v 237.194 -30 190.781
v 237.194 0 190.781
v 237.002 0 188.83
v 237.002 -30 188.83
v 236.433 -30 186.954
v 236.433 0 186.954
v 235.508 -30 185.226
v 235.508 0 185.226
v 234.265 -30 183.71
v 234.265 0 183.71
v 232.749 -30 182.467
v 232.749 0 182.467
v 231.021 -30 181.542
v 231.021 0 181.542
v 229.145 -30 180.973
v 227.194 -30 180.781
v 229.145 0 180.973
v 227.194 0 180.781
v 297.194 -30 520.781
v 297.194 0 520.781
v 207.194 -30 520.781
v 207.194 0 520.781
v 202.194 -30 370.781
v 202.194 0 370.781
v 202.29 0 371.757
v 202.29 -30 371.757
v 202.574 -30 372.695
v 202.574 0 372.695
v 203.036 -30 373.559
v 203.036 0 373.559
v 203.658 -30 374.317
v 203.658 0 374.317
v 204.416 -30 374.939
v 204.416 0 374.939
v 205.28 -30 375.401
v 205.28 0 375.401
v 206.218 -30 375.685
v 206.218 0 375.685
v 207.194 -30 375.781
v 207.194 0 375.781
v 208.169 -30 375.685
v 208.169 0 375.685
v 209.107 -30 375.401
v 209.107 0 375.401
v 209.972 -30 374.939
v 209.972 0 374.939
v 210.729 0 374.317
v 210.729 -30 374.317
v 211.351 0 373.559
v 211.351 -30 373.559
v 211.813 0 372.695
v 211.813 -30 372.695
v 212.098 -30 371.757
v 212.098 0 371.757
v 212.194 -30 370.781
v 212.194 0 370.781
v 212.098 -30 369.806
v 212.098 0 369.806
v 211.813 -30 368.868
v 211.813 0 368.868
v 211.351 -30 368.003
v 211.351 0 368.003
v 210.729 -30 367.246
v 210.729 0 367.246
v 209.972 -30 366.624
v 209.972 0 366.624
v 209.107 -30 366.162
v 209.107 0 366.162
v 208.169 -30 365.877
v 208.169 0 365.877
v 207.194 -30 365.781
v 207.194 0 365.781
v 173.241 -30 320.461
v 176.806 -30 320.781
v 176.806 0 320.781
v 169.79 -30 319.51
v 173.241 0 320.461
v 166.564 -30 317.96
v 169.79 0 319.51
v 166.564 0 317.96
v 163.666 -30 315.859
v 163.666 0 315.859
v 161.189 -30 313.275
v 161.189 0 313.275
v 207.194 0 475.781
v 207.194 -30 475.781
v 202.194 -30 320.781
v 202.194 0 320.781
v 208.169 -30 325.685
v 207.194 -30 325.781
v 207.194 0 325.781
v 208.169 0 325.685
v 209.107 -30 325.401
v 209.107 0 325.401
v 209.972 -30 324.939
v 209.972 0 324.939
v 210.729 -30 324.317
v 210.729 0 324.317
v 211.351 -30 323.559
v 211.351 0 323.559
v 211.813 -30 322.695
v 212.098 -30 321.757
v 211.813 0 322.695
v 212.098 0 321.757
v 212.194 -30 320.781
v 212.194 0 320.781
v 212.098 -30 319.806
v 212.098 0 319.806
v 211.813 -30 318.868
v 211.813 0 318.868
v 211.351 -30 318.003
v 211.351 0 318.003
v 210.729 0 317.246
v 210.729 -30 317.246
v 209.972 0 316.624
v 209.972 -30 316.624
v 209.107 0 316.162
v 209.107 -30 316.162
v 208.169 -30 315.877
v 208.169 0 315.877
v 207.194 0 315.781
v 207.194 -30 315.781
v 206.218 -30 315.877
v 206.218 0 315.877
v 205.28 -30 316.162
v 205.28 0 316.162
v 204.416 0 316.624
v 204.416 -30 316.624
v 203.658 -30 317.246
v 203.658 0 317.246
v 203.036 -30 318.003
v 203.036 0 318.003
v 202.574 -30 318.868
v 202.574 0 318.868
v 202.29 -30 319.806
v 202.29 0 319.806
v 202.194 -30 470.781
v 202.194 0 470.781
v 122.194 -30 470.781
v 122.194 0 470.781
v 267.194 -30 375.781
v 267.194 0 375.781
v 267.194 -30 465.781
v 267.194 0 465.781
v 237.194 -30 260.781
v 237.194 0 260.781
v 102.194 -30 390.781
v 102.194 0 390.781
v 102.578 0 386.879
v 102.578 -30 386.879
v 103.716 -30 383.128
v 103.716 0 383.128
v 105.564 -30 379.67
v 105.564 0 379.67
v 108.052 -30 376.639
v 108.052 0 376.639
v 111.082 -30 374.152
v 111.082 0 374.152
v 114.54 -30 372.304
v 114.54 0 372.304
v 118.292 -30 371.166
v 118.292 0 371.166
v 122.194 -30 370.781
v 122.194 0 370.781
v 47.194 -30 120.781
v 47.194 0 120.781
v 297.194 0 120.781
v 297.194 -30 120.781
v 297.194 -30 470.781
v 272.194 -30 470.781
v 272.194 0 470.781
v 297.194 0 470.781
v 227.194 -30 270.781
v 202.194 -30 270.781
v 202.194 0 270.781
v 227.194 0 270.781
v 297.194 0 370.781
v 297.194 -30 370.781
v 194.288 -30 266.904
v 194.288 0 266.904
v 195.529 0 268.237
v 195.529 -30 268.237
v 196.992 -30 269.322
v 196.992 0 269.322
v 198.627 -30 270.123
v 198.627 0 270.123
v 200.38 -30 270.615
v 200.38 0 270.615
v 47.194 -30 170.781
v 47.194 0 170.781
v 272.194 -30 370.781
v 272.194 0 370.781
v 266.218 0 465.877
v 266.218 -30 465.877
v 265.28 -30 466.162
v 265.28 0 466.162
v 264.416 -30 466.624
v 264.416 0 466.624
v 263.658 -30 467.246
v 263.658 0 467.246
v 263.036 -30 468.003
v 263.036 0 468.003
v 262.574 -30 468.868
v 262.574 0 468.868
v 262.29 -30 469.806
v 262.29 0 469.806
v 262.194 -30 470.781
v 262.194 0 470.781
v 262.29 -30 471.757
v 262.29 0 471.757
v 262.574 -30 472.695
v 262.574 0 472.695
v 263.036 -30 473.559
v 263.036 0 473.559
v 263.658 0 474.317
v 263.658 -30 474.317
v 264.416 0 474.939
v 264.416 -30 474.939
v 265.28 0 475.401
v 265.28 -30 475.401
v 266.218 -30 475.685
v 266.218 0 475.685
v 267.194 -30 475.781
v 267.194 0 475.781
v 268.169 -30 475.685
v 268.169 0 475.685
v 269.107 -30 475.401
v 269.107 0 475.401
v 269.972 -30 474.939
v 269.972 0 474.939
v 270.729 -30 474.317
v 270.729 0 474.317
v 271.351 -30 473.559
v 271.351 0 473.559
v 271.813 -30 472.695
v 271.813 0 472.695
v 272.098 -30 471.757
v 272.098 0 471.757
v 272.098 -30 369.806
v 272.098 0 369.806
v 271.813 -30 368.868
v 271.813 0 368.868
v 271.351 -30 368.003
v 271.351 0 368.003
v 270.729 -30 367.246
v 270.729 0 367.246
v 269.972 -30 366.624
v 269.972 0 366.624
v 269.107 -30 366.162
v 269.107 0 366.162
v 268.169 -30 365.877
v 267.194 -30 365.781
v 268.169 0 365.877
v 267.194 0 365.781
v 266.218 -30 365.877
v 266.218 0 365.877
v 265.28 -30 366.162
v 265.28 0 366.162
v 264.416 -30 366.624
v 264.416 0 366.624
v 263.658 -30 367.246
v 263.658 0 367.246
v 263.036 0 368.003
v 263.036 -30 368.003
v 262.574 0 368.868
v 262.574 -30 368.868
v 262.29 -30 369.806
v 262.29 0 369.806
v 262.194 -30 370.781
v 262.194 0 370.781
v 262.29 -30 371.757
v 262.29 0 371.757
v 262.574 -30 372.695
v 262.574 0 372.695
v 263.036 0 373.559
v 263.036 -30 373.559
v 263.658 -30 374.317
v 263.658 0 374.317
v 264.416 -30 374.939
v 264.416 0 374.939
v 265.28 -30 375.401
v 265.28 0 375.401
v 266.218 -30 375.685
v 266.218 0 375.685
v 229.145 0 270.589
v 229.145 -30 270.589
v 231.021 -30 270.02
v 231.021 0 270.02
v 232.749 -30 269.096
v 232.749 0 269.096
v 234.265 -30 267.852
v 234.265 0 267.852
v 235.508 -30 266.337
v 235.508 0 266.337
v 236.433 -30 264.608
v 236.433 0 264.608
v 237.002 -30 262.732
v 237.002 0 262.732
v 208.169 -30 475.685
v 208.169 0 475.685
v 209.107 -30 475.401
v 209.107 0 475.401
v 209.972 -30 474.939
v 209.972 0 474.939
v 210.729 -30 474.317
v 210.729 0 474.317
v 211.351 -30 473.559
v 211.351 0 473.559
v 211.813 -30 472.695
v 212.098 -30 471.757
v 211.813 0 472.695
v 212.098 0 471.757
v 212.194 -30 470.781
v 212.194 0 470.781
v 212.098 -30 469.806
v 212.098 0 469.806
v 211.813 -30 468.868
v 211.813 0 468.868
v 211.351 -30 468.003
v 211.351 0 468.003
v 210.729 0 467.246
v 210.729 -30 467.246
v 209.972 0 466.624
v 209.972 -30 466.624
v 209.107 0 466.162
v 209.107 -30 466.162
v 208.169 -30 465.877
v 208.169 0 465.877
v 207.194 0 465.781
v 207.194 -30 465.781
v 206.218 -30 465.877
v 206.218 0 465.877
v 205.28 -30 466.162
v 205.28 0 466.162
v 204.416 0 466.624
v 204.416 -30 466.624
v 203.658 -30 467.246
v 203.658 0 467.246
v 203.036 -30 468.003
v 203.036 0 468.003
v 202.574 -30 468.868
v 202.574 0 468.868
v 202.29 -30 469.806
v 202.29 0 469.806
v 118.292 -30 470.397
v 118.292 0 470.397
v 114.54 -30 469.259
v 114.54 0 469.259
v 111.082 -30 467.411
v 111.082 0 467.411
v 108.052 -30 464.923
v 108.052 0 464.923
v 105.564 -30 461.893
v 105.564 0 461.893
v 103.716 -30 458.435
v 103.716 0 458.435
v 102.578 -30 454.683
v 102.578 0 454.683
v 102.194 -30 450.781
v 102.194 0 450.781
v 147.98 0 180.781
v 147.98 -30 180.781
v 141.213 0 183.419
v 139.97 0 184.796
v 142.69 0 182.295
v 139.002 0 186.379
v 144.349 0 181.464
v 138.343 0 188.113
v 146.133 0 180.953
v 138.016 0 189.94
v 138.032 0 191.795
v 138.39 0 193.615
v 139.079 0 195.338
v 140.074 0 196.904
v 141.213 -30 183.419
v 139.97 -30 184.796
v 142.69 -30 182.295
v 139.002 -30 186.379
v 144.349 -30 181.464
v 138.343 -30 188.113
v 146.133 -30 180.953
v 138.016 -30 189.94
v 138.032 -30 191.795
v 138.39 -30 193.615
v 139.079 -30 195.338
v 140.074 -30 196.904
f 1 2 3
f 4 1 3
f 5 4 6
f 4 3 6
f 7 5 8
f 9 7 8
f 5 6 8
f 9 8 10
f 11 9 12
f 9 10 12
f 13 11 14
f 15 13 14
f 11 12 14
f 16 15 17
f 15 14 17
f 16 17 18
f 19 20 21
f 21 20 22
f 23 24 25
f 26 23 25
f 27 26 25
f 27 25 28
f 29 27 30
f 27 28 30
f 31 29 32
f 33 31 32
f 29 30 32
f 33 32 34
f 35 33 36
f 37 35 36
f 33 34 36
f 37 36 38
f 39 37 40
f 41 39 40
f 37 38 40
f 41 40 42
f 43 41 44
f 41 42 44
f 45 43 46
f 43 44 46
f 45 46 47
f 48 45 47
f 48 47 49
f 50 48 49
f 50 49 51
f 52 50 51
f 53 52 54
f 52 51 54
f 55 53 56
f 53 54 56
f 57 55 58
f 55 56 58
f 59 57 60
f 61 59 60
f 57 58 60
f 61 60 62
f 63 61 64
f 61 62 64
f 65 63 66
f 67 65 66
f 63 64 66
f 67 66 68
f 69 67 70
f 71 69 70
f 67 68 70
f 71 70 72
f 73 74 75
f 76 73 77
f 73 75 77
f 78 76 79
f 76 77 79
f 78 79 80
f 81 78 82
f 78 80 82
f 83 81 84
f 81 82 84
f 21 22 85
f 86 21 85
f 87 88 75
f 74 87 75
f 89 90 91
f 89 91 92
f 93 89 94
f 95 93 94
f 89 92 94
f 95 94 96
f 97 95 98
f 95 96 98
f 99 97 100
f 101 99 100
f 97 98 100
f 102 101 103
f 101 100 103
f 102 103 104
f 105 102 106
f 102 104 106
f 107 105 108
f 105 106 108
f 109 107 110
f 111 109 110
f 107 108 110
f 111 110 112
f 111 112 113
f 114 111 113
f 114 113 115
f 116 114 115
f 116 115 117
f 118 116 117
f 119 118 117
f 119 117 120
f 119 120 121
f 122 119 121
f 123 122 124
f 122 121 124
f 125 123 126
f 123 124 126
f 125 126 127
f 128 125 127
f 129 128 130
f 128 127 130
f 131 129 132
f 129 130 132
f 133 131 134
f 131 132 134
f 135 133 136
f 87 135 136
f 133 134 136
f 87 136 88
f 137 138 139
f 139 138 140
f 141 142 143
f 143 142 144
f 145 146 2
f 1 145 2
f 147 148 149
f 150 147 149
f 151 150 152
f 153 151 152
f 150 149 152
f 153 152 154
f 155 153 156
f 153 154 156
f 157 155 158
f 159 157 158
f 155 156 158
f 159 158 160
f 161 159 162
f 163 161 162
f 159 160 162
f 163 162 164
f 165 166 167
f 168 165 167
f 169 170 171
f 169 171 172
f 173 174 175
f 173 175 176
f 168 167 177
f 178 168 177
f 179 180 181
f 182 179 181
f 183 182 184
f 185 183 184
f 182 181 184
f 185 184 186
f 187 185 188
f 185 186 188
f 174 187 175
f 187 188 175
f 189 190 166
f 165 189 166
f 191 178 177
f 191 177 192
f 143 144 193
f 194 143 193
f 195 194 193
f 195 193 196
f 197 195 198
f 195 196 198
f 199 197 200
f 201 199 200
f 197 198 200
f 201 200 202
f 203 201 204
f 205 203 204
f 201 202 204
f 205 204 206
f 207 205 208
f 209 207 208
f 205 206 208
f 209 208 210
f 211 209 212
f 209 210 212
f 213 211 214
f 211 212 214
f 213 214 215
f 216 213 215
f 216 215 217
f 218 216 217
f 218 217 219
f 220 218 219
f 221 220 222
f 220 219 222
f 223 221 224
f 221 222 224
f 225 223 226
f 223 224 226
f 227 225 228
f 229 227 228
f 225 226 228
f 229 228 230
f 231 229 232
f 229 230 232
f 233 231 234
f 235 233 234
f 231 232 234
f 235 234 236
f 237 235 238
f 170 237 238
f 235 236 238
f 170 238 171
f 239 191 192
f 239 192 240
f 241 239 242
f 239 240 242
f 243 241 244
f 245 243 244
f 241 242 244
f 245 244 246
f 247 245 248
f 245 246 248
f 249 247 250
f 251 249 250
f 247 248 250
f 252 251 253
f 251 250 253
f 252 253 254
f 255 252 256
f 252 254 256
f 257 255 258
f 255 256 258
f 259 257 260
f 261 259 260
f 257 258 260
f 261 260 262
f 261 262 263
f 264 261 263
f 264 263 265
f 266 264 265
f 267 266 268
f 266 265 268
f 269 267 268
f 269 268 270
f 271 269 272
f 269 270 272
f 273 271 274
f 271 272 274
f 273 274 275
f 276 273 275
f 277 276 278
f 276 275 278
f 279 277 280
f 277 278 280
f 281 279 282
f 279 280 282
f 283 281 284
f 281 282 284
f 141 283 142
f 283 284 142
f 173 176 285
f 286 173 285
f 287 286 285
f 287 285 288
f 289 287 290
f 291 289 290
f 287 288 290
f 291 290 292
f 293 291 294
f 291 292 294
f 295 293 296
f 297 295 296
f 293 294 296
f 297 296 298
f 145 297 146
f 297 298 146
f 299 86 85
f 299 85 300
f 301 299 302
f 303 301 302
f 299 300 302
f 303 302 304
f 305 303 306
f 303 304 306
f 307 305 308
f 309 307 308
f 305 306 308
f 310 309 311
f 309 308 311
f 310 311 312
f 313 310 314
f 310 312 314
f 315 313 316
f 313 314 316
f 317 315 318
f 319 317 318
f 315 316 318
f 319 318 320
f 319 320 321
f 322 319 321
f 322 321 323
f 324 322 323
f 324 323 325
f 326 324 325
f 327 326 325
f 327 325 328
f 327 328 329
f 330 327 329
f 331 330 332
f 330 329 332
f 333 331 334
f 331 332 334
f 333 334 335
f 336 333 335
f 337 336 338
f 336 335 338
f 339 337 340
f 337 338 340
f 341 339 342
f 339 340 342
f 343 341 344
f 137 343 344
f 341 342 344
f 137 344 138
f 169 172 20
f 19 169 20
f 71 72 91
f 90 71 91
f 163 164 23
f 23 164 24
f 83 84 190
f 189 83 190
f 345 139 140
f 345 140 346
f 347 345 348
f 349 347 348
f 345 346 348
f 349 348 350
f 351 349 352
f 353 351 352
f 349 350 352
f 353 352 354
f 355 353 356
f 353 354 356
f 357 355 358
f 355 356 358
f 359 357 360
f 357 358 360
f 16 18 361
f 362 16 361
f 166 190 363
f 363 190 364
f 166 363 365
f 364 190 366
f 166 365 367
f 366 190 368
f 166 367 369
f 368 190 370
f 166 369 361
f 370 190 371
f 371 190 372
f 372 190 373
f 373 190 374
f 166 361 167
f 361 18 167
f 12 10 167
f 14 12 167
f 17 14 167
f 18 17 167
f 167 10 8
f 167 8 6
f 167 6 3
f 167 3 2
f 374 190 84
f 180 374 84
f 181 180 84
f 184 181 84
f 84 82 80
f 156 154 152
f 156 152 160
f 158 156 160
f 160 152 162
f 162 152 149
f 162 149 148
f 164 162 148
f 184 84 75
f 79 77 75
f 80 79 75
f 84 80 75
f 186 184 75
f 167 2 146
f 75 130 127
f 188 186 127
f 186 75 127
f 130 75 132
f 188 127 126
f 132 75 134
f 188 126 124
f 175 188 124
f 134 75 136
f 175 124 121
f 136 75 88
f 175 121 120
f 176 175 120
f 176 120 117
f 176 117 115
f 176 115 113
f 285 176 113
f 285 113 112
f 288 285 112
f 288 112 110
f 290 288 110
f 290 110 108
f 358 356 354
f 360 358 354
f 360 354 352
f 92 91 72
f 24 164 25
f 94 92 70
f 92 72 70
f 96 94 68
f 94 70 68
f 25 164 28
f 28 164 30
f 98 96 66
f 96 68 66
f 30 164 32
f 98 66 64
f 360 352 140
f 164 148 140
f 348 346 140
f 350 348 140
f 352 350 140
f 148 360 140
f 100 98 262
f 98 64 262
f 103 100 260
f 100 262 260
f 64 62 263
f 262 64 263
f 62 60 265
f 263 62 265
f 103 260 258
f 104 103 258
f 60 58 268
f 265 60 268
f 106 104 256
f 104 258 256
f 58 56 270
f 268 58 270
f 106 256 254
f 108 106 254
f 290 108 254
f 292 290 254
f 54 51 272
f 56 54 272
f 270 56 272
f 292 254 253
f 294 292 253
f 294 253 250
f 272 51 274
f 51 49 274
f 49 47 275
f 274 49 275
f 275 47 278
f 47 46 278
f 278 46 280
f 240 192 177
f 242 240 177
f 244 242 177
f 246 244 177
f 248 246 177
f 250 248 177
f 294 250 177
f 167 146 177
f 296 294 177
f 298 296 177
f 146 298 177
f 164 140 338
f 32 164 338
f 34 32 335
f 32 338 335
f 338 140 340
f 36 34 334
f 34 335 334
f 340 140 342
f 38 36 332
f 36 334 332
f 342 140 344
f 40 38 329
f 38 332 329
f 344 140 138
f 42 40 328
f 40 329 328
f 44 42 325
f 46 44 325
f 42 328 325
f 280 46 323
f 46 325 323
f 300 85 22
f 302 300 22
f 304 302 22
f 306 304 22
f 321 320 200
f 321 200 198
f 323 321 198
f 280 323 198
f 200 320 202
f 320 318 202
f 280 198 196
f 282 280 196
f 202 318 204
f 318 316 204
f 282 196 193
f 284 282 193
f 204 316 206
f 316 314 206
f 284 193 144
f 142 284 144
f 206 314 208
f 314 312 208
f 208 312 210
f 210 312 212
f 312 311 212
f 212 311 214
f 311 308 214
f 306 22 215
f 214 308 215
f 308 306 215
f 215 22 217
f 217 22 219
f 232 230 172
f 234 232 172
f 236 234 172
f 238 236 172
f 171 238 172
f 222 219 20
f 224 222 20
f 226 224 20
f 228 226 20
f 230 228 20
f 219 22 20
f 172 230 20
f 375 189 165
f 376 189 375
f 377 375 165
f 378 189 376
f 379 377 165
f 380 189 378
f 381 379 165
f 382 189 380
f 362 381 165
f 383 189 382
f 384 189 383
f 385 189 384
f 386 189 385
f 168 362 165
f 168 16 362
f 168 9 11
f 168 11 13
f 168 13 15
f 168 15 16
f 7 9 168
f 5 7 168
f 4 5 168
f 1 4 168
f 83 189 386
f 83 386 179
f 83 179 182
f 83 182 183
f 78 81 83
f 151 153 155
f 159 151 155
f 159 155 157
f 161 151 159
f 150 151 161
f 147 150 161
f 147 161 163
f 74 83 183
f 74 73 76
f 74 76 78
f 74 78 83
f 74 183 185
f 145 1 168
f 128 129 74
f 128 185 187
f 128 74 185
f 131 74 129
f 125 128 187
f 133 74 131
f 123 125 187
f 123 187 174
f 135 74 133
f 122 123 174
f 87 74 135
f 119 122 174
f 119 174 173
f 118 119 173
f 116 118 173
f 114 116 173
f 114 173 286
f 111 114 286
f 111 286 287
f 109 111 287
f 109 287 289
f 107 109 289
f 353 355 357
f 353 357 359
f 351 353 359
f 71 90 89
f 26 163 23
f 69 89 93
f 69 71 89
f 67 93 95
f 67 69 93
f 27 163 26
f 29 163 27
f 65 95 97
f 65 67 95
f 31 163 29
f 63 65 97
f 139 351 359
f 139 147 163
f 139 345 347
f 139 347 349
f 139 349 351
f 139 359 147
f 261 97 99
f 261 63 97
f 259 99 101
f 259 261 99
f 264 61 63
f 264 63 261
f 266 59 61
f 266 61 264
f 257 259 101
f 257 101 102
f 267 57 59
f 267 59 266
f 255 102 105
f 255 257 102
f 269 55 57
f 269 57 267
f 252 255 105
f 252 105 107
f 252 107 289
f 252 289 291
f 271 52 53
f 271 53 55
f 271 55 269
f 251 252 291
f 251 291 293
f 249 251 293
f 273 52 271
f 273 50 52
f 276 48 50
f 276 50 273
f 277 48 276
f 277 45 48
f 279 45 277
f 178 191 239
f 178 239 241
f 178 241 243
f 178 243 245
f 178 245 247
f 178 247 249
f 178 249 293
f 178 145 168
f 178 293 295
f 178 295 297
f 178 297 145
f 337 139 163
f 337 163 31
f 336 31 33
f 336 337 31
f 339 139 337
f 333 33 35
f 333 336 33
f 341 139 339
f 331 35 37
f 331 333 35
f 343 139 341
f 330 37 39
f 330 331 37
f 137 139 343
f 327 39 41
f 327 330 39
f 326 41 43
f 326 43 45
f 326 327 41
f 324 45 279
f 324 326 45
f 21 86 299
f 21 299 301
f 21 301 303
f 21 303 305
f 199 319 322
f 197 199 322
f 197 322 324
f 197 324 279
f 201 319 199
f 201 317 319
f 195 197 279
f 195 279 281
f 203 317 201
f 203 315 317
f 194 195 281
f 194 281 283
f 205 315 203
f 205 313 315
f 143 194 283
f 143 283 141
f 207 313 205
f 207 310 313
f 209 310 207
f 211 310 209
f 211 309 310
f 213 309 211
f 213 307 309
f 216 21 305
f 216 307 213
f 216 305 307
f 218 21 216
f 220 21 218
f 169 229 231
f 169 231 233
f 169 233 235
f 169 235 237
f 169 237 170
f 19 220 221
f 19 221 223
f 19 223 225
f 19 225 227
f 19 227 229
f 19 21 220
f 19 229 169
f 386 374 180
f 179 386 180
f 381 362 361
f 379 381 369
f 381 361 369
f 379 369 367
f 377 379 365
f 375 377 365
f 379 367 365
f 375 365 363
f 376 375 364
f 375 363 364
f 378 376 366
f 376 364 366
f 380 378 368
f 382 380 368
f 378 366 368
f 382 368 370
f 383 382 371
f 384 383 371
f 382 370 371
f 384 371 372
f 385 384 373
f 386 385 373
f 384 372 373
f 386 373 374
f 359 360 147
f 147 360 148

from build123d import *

# Parameters (mm, degrees)
F1_DEPTH = 30


with BuildPart() as f1:
    # F0 (on Front) → F1 (new body)
    with BuildSketch(Plane.XZ):
        with BuildLine():
            Line((47.193784, 170.781278), (47.193784, 120.781278))
            Line((47.193784, 120.781278), (297.193784, 120.781278))
            Line((297.193784, 120.781278), (297.193784, 370.781278))
            Line((297.193784, 370.781278), (272.193784, 370.781278))
            ThreePointArc((272.193784, 370.781278), (263.65825, 367.245744), (267.193784, 375.781278))
            Line((267.193784, 375.781278), (267.193784, 465.781278))
            ThreePointArc((267.193784, 465.781278), (263.65825, 474.316811), (272.193784, 470.781278))
            Line((272.193784, 470.781278), (297.193784, 470.781278))
            Line((297.193784, 470.781278), (297.193784, 520.781278))
            Line((297.193784, 520.781278), (207.193784, 520.781278))
            Line((207.193784, 520.781278), (207.193784, 475.781278))
            ThreePointArc((207.193784, 475.781278), (210.729318, 467.245744), (202.193784, 470.781278))
            Line((202.193784, 470.781278), (122.193784, 470.781278))
            ThreePointArc((122.193784, 470.781278), (108.051649, 464.923413), (102.193784, 450.781278))
            Line((102.193784, 450.781278), (102.193784, 390.781278))
            ThreePointArc((102.193784, 390.781278), (108.051649, 376.639142), (122.193784, 370.781278))
            Line((122.193784, 370.781278), (202.193784, 370.781278))
            ThreePointArc((202.193784, 370.781278), (210.729318, 374.316811), (207.193784, 365.781278))
            Line((207.193784, 365.781278), (207.193784, 325.781278))
            ThreePointArc((207.193784, 325.781278), (210.729318, 317.245744), (202.193784, 320.781278))
            Line((202.193784, 320.781278), (176.806281, 320.781278))
            ThreePointArc((176.806281, 320.781278), (168.142507, 318.807342), (161.188905, 313.275178))
            Line((161.188905, 313.275178), (47.193784, 170.781278))
        make_face()
        with BuildLine():
            Line((227.193784, 170.781278), (147.980179, 170.781278))
            ThreePointArc((147.980179, 170.781278), (130.022925, 181.975766), (132.167898, 203.027574))
            Line((132.167898, 203.027574), (186.381503, 273.027574))
            ThreePointArc((186.381503, 273.027574), (193.388273, 278.738531), (202.193784, 280.781278))
            Line((202.193784, 280.781278), (227.193784, 280.781278))
            ThreePointArc((227.193784, 280.781278), (241.33592, 274.923413), (247.193784, 260.781278))
            Line((247.193784, 260.781278), (247.193784, 190.781278))
            ThreePointArc((247.193784, 190.781278), (241.33592, 176.639142), (227.193784, 170.781278))
        make_face(mode=Mode.SUBTRACT)
        with BuildLine():
            ThreePointArc((132.167898, 203.027574), (130.022925, 181.975766), (147.980179, 170.781278))
            Line((147.980179, 170.781278), (227.193784, 170.781278))
            ThreePointArc((227.193784, 170.781278), (241.33592, 176.639142), (247.193784, 190.781278))
            Line((247.193784, 190.781278), (247.193784, 260.781278))
            ThreePointArc((247.193784, 260.781278), (241.33592, 274.923413), (227.193784, 280.781278))
            Line((227.193784, 280.781278), (202.193784, 280.781278))
            ThreePointArc((202.193784, 280.781278), (193.388273, 278.738531), (186.381503, 273.027574))
            Line((186.381503, 273.027574), (132.167898, 203.027574))
        make_face()
        with BuildLine():
            ThreePointArc((147.980179, 180.781278), (139.001552, 186.378522), (140.074039, 196.904426))
            Line((140.074039, 196.904426), (194.287644, 266.904426))
            ThreePointArc((194.287644, 266.904426), (197.791028, 269.759904), (202.193784, 270.781278))
            Line((202.193784, 270.781278), (227.193784, 270.781278))
            ThreePointArc((227.193784, 270.781278), (234.264852, 267.852345), (237.193784, 260.781278))
            Line((237.193784, 260.781278), (237.193784, 190.781278))
            ThreePointArc((237.193784, 190.781278), (234.264852, 183.71021), (227.193784, 180.781278))
            Line((227.193784, 180.781278), (147.980179, 180.781278))
        make_face(mode=Mode.SUBTRACT)
    extrude(amount=F1_DEPTH)


solid = f1.part
